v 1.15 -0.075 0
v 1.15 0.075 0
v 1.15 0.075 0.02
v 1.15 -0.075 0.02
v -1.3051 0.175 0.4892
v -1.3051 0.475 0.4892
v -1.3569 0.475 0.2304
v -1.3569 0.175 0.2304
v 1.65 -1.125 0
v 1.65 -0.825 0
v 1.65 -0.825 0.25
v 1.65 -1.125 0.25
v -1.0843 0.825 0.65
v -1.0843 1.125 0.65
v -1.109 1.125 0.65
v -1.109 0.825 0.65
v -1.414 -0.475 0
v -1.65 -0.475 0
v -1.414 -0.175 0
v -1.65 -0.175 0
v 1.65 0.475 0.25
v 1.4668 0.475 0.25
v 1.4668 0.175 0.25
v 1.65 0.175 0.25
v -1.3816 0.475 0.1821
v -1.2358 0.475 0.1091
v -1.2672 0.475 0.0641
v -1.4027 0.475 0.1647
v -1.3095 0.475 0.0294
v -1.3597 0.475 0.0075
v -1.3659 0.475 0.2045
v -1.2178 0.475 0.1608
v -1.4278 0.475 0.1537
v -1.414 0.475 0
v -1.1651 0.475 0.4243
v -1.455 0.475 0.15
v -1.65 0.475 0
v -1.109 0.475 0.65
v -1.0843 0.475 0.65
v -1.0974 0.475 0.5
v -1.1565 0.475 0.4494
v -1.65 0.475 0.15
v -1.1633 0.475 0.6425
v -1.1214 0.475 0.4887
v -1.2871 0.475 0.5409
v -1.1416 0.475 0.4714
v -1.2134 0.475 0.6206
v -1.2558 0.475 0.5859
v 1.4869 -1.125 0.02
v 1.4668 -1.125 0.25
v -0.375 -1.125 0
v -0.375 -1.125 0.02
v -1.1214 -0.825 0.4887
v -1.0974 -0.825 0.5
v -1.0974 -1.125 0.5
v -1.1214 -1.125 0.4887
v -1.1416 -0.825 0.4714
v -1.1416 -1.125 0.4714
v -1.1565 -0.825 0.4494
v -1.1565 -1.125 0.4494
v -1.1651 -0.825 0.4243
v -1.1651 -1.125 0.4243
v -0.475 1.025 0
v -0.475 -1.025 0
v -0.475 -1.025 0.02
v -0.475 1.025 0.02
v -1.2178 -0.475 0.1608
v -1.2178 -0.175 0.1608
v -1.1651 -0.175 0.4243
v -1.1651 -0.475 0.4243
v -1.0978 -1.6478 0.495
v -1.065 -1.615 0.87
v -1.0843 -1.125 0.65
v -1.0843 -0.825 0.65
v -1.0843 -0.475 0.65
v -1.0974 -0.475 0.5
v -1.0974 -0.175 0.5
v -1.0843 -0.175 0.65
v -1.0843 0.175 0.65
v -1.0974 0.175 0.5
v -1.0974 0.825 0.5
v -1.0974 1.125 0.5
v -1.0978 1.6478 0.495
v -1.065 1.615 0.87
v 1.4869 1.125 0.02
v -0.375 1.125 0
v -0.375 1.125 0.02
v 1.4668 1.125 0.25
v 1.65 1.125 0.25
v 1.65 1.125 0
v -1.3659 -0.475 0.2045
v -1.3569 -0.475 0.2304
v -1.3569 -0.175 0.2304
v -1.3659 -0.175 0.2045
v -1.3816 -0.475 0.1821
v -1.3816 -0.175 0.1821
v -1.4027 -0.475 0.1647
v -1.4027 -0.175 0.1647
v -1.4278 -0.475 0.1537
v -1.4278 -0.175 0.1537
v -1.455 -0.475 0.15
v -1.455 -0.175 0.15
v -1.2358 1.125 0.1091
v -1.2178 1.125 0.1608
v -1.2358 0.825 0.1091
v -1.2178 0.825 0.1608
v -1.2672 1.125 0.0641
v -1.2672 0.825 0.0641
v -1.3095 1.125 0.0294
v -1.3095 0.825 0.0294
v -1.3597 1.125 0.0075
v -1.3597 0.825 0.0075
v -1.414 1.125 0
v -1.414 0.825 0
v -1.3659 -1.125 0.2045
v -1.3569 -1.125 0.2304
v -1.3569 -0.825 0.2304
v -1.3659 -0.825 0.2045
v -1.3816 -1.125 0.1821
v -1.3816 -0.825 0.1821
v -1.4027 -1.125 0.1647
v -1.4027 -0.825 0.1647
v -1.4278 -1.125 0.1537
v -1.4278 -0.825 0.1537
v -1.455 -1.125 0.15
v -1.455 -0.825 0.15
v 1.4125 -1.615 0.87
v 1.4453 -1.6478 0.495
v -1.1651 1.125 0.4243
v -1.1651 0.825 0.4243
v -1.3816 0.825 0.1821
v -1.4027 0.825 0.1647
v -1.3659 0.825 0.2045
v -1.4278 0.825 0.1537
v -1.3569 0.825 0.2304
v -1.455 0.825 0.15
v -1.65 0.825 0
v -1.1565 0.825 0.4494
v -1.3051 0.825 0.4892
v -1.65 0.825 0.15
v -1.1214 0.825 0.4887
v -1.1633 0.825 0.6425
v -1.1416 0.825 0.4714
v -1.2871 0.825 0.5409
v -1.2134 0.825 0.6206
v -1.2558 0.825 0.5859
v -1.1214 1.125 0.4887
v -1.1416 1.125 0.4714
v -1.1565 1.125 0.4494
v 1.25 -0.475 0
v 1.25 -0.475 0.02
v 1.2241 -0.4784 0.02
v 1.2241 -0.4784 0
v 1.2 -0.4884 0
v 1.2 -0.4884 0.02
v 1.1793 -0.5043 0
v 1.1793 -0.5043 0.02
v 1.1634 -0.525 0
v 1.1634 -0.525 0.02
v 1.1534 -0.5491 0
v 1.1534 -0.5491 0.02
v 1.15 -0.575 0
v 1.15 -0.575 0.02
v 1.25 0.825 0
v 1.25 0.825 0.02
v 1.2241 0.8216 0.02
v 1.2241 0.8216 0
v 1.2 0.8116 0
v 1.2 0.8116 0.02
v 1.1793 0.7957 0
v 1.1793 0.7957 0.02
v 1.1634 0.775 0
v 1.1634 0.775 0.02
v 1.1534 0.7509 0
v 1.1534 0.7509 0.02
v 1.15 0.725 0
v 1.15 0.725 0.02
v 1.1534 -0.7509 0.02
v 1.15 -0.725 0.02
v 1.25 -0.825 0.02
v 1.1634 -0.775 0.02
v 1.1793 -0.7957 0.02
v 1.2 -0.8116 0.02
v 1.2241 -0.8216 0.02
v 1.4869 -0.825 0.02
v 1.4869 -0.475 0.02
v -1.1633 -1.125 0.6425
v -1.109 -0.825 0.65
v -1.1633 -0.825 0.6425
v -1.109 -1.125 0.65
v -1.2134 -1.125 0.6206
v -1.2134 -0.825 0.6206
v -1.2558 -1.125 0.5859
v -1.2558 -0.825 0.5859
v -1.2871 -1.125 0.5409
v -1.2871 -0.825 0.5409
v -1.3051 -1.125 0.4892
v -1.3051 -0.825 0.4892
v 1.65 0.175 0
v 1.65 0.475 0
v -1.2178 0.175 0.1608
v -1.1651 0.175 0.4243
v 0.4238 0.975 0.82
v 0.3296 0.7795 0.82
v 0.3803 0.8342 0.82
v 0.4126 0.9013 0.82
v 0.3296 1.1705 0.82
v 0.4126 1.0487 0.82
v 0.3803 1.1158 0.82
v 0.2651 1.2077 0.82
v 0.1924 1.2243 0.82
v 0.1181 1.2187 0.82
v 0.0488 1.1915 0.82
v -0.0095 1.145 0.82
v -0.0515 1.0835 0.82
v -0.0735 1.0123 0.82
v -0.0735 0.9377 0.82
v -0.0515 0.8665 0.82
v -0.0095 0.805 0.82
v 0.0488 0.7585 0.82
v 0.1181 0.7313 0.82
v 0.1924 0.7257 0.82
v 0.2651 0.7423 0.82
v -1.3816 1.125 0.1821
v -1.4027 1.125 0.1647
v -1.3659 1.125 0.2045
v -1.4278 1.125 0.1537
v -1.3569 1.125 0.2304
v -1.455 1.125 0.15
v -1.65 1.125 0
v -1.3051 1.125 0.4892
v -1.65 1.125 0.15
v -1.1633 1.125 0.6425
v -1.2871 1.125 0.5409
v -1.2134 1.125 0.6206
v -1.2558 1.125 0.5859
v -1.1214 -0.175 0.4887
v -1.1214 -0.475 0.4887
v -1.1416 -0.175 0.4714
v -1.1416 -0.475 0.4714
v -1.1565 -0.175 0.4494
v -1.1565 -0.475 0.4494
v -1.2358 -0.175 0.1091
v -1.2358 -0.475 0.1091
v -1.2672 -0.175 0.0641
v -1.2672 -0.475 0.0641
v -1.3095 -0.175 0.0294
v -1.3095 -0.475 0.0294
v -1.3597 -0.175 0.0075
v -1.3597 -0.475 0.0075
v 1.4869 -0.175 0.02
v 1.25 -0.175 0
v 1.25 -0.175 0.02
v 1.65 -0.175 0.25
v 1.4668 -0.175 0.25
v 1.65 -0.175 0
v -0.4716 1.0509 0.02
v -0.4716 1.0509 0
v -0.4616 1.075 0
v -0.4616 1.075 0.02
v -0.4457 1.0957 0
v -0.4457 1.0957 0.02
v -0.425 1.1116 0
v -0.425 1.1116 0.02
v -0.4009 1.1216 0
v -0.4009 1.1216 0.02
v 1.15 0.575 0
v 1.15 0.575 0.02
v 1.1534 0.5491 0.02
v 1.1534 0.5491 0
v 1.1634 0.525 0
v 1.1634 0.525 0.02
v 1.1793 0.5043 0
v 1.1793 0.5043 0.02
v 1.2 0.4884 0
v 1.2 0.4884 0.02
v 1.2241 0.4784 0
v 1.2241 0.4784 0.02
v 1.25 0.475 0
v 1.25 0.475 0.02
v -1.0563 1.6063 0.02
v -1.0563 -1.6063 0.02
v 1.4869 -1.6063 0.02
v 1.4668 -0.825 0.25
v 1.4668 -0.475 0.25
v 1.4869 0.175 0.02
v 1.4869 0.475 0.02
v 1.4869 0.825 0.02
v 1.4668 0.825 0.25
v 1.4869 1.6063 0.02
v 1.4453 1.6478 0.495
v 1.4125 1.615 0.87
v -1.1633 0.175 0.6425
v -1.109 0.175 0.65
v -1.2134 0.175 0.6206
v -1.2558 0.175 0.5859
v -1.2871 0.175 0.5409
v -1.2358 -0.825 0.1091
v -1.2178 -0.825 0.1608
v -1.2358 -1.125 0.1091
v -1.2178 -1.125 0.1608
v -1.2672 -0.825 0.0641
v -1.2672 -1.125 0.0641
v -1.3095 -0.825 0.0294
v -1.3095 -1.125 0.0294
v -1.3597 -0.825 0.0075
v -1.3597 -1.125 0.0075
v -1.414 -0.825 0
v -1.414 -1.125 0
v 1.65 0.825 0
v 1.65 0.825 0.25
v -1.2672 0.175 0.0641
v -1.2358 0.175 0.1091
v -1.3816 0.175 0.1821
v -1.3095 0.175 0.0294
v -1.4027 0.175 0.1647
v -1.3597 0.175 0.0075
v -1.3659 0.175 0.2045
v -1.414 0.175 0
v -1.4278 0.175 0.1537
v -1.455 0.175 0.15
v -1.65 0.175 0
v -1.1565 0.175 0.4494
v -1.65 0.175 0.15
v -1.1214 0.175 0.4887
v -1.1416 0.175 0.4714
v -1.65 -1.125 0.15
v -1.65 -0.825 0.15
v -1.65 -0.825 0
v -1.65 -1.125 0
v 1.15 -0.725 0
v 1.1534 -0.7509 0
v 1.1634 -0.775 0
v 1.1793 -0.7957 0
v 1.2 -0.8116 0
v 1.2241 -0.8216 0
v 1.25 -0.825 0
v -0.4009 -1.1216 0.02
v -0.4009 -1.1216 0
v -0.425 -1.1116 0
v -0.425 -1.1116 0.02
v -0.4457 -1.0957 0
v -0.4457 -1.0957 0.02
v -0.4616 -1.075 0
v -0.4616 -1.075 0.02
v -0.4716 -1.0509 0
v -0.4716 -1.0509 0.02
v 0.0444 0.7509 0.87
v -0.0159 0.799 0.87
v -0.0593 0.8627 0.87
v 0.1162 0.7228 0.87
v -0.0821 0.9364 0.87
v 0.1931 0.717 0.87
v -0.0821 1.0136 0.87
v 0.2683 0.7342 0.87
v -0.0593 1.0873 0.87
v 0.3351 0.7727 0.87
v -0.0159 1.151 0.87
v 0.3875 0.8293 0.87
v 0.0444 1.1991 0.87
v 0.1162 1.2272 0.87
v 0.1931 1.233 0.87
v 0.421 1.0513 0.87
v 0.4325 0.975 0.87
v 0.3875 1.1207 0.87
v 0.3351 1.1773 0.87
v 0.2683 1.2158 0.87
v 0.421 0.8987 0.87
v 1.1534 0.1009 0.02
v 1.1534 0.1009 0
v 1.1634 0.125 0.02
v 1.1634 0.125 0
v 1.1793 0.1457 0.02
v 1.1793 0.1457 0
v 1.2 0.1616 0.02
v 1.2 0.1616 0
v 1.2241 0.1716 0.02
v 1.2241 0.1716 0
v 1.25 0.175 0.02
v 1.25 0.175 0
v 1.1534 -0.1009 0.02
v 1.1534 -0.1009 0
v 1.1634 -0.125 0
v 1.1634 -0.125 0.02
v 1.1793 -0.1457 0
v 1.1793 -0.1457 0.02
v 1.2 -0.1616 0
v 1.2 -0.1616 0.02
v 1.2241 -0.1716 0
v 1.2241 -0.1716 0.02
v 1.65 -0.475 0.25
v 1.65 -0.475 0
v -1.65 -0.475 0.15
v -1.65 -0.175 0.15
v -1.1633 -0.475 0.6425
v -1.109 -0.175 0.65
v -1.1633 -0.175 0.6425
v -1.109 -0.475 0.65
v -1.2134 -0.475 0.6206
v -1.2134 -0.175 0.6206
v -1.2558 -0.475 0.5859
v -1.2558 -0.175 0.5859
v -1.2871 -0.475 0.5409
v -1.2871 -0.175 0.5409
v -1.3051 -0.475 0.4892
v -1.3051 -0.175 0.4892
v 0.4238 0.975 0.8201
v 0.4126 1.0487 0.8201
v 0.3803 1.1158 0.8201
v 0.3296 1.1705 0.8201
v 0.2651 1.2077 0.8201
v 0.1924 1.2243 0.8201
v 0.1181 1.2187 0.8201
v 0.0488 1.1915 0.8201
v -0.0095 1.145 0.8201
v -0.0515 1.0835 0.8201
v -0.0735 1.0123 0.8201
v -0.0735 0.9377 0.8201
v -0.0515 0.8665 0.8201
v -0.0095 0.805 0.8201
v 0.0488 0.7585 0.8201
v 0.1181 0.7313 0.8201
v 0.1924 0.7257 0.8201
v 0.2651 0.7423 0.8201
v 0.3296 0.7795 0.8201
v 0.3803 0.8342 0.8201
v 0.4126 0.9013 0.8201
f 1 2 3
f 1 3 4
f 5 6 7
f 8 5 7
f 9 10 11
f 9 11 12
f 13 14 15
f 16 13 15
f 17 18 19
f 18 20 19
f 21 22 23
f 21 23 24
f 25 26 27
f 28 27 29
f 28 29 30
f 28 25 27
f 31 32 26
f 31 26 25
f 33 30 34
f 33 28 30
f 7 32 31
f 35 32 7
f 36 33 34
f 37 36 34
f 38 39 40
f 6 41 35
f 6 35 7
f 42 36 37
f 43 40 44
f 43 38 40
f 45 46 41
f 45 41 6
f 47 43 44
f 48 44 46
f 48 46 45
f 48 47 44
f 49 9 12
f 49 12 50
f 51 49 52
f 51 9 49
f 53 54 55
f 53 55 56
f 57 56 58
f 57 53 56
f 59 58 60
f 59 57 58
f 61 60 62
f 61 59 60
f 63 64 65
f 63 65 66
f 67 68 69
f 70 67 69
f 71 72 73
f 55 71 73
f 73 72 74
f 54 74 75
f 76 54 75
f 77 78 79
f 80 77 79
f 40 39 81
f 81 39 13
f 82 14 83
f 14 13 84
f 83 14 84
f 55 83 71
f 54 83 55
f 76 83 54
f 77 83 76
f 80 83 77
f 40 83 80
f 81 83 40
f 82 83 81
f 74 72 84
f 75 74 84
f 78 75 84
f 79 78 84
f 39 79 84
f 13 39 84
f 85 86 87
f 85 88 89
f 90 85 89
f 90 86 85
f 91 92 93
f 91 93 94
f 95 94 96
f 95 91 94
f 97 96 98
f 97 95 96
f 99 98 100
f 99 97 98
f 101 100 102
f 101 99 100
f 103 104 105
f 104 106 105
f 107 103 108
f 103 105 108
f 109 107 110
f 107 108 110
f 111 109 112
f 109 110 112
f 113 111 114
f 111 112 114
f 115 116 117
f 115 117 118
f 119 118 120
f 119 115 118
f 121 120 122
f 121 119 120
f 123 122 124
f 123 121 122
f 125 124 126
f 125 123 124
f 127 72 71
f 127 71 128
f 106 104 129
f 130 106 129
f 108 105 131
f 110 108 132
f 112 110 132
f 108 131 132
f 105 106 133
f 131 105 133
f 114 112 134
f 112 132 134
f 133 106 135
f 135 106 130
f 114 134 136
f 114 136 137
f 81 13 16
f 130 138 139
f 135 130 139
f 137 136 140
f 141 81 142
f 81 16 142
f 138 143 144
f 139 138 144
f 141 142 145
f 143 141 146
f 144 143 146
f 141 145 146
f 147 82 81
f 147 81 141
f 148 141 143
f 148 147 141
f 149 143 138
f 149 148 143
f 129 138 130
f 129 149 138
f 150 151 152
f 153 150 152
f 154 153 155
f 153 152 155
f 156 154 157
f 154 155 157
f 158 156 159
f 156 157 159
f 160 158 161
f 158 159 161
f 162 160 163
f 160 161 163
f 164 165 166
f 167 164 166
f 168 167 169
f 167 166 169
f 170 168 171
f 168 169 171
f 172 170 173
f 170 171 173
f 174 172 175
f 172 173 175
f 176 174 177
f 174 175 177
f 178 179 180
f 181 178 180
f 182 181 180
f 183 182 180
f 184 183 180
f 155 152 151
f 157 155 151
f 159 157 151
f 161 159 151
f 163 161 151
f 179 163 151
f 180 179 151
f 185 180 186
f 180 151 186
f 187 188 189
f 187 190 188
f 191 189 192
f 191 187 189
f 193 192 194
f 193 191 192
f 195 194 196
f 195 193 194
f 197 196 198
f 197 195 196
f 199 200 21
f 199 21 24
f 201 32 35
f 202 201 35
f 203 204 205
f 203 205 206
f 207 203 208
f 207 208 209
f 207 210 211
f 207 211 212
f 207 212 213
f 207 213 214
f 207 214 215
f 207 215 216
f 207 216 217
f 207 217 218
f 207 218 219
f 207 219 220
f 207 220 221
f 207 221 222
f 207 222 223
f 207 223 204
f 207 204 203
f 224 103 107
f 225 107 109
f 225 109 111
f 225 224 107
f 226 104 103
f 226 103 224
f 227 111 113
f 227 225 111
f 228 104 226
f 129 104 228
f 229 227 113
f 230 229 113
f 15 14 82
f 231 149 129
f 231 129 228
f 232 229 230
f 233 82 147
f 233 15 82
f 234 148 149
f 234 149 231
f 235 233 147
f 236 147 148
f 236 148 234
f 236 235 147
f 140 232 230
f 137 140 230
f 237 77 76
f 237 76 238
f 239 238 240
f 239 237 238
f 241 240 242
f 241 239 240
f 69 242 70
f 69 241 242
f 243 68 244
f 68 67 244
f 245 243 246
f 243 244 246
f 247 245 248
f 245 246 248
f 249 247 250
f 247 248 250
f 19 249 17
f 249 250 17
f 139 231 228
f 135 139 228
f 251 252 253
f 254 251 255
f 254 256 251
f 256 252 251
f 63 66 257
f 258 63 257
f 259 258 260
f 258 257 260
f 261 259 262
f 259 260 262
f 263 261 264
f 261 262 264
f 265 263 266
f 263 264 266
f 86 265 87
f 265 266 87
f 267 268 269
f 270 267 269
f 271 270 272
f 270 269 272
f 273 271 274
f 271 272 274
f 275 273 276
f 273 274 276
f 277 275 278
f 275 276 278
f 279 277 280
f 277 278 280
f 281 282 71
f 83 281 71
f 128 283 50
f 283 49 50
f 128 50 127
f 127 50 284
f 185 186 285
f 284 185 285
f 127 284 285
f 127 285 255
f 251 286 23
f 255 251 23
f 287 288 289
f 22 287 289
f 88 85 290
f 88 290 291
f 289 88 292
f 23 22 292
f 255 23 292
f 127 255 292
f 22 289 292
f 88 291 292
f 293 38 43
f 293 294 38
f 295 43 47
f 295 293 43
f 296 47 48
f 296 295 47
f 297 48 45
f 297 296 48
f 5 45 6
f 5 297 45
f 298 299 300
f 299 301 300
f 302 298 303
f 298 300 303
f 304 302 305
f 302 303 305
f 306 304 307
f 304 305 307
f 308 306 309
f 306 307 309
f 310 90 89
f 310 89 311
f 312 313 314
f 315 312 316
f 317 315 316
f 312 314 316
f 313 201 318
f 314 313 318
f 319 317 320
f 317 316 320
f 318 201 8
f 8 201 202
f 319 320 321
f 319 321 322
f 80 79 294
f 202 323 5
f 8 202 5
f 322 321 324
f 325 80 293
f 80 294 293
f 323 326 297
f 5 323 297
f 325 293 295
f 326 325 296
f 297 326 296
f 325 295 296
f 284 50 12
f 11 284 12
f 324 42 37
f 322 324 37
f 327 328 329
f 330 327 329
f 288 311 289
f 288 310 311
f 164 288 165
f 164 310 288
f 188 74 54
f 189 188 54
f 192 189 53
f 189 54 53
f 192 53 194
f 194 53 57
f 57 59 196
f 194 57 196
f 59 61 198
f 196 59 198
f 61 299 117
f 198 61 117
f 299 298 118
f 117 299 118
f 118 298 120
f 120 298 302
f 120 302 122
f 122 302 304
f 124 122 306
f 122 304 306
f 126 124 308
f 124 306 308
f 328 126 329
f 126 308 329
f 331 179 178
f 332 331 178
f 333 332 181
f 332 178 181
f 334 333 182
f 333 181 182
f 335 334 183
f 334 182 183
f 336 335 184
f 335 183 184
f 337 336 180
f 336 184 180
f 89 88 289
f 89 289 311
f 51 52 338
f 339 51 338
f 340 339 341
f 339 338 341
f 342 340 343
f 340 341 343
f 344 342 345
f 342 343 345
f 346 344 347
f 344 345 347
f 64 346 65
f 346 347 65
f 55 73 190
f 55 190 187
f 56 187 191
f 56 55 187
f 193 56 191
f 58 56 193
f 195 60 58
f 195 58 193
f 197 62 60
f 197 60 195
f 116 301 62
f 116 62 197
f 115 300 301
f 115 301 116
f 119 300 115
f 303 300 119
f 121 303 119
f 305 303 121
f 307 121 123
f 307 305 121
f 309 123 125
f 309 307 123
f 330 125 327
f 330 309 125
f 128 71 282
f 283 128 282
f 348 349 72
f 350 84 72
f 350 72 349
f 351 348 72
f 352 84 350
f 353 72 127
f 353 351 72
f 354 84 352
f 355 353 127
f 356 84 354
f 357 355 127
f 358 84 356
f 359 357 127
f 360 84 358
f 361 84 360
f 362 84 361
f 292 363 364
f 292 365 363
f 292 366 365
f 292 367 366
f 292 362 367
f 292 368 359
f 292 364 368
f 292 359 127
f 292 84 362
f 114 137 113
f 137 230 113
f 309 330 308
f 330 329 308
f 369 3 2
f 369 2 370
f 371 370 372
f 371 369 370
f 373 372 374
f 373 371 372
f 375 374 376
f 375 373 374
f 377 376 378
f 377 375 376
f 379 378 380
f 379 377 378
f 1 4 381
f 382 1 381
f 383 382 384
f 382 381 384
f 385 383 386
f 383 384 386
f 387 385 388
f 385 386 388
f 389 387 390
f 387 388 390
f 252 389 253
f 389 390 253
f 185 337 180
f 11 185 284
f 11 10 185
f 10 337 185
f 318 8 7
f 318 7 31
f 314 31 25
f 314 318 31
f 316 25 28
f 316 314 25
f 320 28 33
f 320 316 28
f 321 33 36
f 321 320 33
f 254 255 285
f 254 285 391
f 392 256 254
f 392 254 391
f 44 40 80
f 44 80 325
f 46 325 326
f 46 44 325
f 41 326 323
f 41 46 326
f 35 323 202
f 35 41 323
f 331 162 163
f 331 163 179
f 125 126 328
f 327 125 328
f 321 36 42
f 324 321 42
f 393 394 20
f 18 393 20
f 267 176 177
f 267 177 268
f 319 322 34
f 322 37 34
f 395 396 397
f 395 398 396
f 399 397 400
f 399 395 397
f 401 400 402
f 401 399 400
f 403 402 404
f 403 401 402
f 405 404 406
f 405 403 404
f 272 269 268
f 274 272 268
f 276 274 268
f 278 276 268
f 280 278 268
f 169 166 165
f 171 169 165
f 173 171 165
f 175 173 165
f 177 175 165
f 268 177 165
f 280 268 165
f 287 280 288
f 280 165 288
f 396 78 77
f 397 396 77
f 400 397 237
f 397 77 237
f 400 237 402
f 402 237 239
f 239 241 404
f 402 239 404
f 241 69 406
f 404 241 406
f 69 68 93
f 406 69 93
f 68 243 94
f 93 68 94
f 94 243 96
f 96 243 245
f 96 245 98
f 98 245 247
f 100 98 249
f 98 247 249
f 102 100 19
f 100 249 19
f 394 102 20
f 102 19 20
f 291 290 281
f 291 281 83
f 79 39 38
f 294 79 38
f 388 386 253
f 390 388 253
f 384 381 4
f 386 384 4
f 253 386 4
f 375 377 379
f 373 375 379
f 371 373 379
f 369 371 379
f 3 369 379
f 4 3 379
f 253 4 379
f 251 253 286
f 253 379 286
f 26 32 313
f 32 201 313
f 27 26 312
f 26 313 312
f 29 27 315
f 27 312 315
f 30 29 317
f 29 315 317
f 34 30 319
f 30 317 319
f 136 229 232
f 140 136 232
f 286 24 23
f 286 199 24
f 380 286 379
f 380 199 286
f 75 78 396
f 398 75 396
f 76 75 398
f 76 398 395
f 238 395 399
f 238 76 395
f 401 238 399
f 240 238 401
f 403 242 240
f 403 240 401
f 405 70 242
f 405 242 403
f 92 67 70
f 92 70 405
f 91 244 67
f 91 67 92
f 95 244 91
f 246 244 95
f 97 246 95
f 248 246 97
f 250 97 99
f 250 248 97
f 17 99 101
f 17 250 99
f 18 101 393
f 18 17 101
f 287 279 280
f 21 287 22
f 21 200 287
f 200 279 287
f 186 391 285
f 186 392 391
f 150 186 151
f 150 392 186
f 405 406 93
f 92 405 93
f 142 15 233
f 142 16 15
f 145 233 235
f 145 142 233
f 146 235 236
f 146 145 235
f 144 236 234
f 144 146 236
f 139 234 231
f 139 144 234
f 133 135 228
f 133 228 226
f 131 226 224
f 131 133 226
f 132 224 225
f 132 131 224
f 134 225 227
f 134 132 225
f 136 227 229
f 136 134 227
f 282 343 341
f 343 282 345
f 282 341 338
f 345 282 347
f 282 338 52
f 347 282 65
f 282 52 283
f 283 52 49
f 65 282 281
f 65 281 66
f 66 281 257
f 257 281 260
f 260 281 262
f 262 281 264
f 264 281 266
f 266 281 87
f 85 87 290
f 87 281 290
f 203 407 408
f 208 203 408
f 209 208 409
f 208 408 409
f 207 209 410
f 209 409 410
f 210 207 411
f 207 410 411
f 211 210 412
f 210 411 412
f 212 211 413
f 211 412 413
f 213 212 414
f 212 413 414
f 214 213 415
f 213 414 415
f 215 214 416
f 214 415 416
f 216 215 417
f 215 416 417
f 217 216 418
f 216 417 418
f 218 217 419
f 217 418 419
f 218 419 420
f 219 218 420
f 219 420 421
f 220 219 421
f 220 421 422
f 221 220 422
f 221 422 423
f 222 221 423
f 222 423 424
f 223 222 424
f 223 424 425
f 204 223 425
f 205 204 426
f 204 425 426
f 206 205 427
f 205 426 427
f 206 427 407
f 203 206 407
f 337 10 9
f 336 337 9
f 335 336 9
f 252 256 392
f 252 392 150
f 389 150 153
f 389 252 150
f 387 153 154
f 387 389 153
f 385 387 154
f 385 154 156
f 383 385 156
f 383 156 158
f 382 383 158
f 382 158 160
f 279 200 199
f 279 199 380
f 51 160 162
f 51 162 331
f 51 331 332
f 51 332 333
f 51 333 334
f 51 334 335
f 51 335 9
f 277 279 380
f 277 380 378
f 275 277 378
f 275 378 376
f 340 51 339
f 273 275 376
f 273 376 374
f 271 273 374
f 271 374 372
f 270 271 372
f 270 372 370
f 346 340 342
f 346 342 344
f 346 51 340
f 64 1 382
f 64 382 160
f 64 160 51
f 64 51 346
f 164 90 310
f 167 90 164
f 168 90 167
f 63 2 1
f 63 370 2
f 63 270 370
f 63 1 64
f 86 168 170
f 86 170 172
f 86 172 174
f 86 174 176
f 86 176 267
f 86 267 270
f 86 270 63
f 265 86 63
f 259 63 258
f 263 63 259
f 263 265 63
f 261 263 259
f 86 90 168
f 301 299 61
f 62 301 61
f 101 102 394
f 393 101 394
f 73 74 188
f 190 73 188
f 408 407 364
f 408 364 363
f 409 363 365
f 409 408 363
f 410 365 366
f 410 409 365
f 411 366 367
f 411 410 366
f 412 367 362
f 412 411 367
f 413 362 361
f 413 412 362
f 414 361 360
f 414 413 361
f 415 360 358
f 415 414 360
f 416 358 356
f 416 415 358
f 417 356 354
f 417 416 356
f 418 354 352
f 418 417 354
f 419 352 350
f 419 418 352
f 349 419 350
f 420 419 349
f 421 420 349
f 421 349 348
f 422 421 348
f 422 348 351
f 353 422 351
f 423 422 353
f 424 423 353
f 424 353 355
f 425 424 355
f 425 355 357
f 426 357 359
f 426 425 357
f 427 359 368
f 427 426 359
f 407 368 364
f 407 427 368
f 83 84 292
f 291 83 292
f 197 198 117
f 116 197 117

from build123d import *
from OCP.BRepFilletAPI import BRepFilletAPI_MakeChamfer

# Parameters (mm, degrees)
BOSS_EXTRUDE1_DEPTH    = 0.25
FILLET1_R              = 0.1
SKETCH3_W              = 2.6
SKETCH3_H              = 3.3
BOSS_EXTRUDE2_DEPTH    = 0.85
CHAMFER2_SIZE          = 1
CHAMFER2_SIZE_2        = 0.087488664
CHAMFER3_SIZE          = 0.4
CHAMFER3_SIZE2         = 0.034995465
CHAMFER4_SIZE          = 0.043744332
CHAMFER4_SIZE_2        = 0.5
BOSS_EXTRUDE3_DEPTH    = 0.15
FILLET2_R              = 0.1
FILLET3_R              = 0.2
LPATTERN1_COUNT        = 4
LPATTERN1_PITCH        = 0.65
FILLET2_OF_LPATTERN1_R = 0.1
FILLET3_OF_LPATTERN1_R = 0.2
SKETCH5_R              = 0.25
CUT_EXTRUDE1_DEPTH     = 0.05
CHAMFER5_SIZE2         = 0.05
CHAMFER5_SIZE          = 0.008816349


# Some blends are built 0.0001 mm under size
with BuildPart() as part:
    # Sketch2 → Boss-Extrude1 (new body)
    with BuildSketch(Plane.XY):
        Polygon((1.15, 0.175), (1.15, -0.175), (1.65, -0.175), (1.65, -0.475), (1.15, -0.475), (1.15, -0.825), (1.65, -0.825), (1.65, -1.125), (-0.475, -1.125), (-0.475, 1.125), (1.65, 1.125), (1.65, 0.825), (1.15, 0.825), (1.15, 0.475), (1.65, 0.475), (1.65, 0.175), align=None)
    extrude(amount=BOSS_EXTRUDE1_DEPTH)

    # Fillet1
    fillet1_edges = [part.edges().sort_by_distance(p)[0] for p in [
        (-0.475, 1.125, 0.125),
        (1.15, 0.825, 0.125),
        (1.15, 0.475, 0.125),
        (1.15, 0.175, 0.125),
        (1.15, -0.175, 0.125),
        (1.15, -0.475, 0.125),
        (1.15, -0.825, 0.125),
        (-0.475, -1.125, 0.125),
    ]]
    fillet(fillet1_edges, radius=FILLET1_R)

    # Sketch3 → Boss-Extrude2 (add)
    with BuildSketch(Plane.XY.offset(0.02)):
        with Locations((0.2, 0)):
            Rectangle(SKETCH3_W, SKETCH3_H)
    extrude(amount=BOSS_EXTRUDE2_DEPTH)

    # Chamfer2
    # the kernel refuses this chamfer: 1, 0.087488664 mm, written as the material it takes off along each edge
    with BuildSketch(Plane(origin=(1.5, 4.24963408, 0.87), x_dir=(0.0033526157940331684, 0, -0.9999943799678764), z_dir=(0, -1, 0))) as chamfer2_piece_1_section:
        Polygon((CHAMFER2_SIZE * 0.999994379968, -CHAMFER2_SIZE * 0.00335261579403), (-CHAMFER2_SIZE_2 * 0.00335261577587, -CHAMFER2_SIZE_2 * 0.999994374549), (0, 0), align=None)
    chamfer2_piece_1 = extrude(amount=8.49926816, mode=Mode.PRIVATE)
    chamfer2_piece_1 = split(chamfer2_piece_1, bisect_by=Plane(origin=(1.487680055, 1.125, 0.15163522), z_dir=(0, 1, 0)), keep=Keep.TOP, mode=Mode.PRIVATE)
    add(chamfer2_piece_1, mode=Mode.SUBTRACT)
    with BuildSketch(Plane(origin=(1.5, 4.24963408, 0.87), x_dir=(0.0033526157940331684, 0, -0.9999943799678764), z_dir=(0, -1, 0))) as chamfer2_piece_2_section:
        Polygon((CHAMFER2_SIZE * 0.999994379968, -CHAMFER2_SIZE * 0.00335261579403), (-CHAMFER2_SIZE_2 * 0.00335261577587, -CHAMFER2_SIZE_2 * 0.999994374549), (0, 0), align=None)
    chamfer2_piece_2 = extrude(amount=8.49926816, mode=Mode.PRIVATE)
    chamfer2_piece_2 = split(chamfer2_piece_2, bisect_by=Plane(origin=(1.467785575, 0.975, 0.25), z_dir=(0, 0, 1)), keep=Keep.TOP, mode=Mode.PRIVATE)
    add(chamfer2_piece_2, mode=Mode.SUBTRACT)
    with BuildSketch(Plane(origin=(1.5, 4.24963408, 0.87), x_dir=(0.0033526157940331684, 0, -0.9999943799678764), z_dir=(0, -1, 0))) as chamfer2_piece_3_section:
        Polygon((CHAMFER2_SIZE * 0.999994379968, -CHAMFER2_SIZE * 0.00335261579403), (-CHAMFER2_SIZE_2 * 0.00335261577587, -CHAMFER2_SIZE_2 * 0.999994374549), (0, 0), align=None)
    chamfer2_piece_3 = extrude(amount=8.49926816, mode=Mode.PRIVATE)
    chamfer2_piece_3 = split(chamfer2_piece_3, bisect_by=Plane(origin=(1.487680055, 0.475, 0.15163522), z_dir=(0, 1, 0)), keep=Keep.TOP, mode=Mode.PRIVATE)
    chamfer2_piece_3 = split(chamfer2_piece_3, bisect_by=Plane(origin=(1.487680055, 0.825, 0.15163522), z_dir=(0, -1, 0)), keep=Keep.TOP, mode=Mode.PRIVATE)
    add(chamfer2_piece_3, mode=Mode.SUBTRACT)
    with BuildSketch(Plane(origin=(1.5, 4.24963408, 0.87), x_dir=(0.0033526157940331684, 0, -0.9999943799678764), z_dir=(0, -1, 0))) as chamfer2_piece_4_section:
        Polygon((CHAMFER2_SIZE * 0.999994379968, -CHAMFER2_SIZE * 0.00335261579403), (-CHAMFER2_SIZE_2 * 0.00335261577587, -CHAMFER2_SIZE_2 * 0.999994374549), (0, 0), align=None)
    chamfer2_piece_4 = extrude(amount=8.49926816, mode=Mode.PRIVATE)
    chamfer2_piece_4 = split(chamfer2_piece_4, bisect_by=Plane(origin=(1.487680055, 0.175, 0.15163522), z_dir=(0, -1, 0)), keep=Keep.TOP, mode=Mode.PRIVATE)
    chamfer2_piece_4 = split(chamfer2_piece_4, bisect_by=Plane(origin=(1.487680055, -0.175, 0.15163522), z_dir=(0, 1, 0)), keep=Keep.TOP, mode=Mode.PRIVATE)
    add(chamfer2_piece_4, mode=Mode.SUBTRACT)
    with BuildSketch(Plane(origin=(1.5, 4.24963408, 0.87), x_dir=(0.0033526157940331684, 0, -0.9999943799678764), z_dir=(0, -1, 0))) as chamfer2_piece_5_section:
        Polygon((CHAMFER2_SIZE * 0.999994379968, -CHAMFER2_SIZE * 0.00335261579403), (-CHAMFER2_SIZE_2 * 0.00335261577587, -CHAMFER2_SIZE_2 * 0.999994374549), (0, 0), align=None)
    chamfer2_piece_5 = extrude(amount=8.49926816, mode=Mode.PRIVATE)
    chamfer2_piece_5 = split(chamfer2_piece_5, bisect_by=Plane(origin=(1.487680055, -0.475, 0.15163522), z_dir=(0, -1, 0)), keep=Keep.TOP, mode=Mode.PRIVATE)
    chamfer2_piece_5 = split(chamfer2_piece_5, bisect_by=Plane(origin=(1.487680055, -0.825, 0.15163522), z_dir=(0, 1, 0)), keep=Keep.TOP, mode=Mode.PRIVATE)
    add(chamfer2_piece_5, mode=Mode.SUBTRACT)
    with BuildSketch(Plane(origin=(1.5, 4.24963408, 0.87), x_dir=(0.0033526157940331684, 0, -0.9999943799678764), z_dir=(0, -1, 0))) as chamfer2_piece_6_section:
        Polygon((CHAMFER2_SIZE * 0.999994379968, -CHAMFER2_SIZE * 0.00335261579403), (-CHAMFER2_SIZE_2 * 0.00335261577587, -CHAMFER2_SIZE_2 * 0.999994374549), (0, 0), align=None)
    chamfer2_piece_6 = extrude(amount=8.49926816, mode=Mode.PRIVATE)
    chamfer2_piece_6 = split(chamfer2_piece_6, bisect_by=Plane(origin=(1.487680055, -1.125, 0.15163522), z_dir=(0, -1, 0)), keep=Keep.TOP, mode=Mode.PRIVATE)
    add(chamfer2_piece_6, mode=Mode.SUBTRACT)

    # Chamfer3: one chamfer whose edges measure the first distance from different faces: ONE call of the kernel's chamfer builder (chamfer() names one face for all edges)
    chamfer3_edges_1 = [part.edges().sort_by_distance(p)[0] for p in [
        (-1.1, 0, 0.87),
    ]]
    chamfer3_side_1 = [part.faces().sort_by_distance(p)[0] for p in [
        (-1.1, 0, 0.445),
    ]]
    chamfer3_edges_2 = [part.edges().sort_by_distance(p)[0] for p in [
        (0.156255668, -1.65, 0.87),
    ]]
    chamfer3_side_2 = [part.faces().sort_by_distance(p)[0] for p in [
        (0.174937383, -1.65, 0.442934048),
    ]]
    chamfer3_edges_3 = [part.edges().sort_by_distance(p)[0] for p in [
        (0.156255668, 1.65, 0.87),
    ]]
    chamfer3_side_3 = [part.faces().sort_by_distance(p)[0] for p in [
        (0.174937383, 1.65, 0.442934048),
    ]]
    chamfer3 = BRepFilletAPI_MakeChamfer(part.part.solid().wrapped)
    for e in chamfer3_edges_1:
        chamfer3.Add(CHAMFER3_SIZE, CHAMFER3_SIZE2, e.wrapped, chamfer3_side_1[0].wrapped)  # the first distance lies on this face
    for e in chamfer3_edges_2:
        chamfer3.Add(CHAMFER3_SIZE, CHAMFER3_SIZE2, e.wrapped, chamfer3_side_2[0].wrapped)  # the first distance lies on this face
    for e in chamfer3_edges_3:
        chamfer3.Add(CHAMFER3_SIZE, CHAMFER3_SIZE2, e.wrapped, chamfer3_side_3[0].wrapped)  # the first distance lies on this face
    add(Compound.cast(chamfer3.Shape()), mode=Mode.REPLACE)

    # Chamfer4
    # the kernel refuses this chamfer: 0.5, 0.043744332 mm, written as the material it takes off along each edge
    with BuildSketch(Plane(origin=(-2.39981704, 1.65, 0.02), x_dir=(0, -0.9159861691531118, -0.4012098427509062), z_dir=(1, 0, 0))) as chamfer4_piece_1:
        Polygon((CHAMFER4_SIZE * 0.91598616419, -CHAMFER4_SIZE * 0.401209840577), (-CHAMFER4_SIZE_2 * 0.401209842751, -CHAMFER4_SIZE_2 * 0.915986169153), (0, 0), align=None)
    extrude(amount=5.18651078, mode=Mode.SUBTRACT)
    with BuildSketch(Plane(origin=(-1.1, -2.94981704, 0.02), x_dir=(0.9159861691531118, 0, -0.4012098427509062), z_dir=(0, 1, 0))) as chamfer4_piece_2:
        Polygon((CHAMFER4_SIZE * 0.91598616419, -CHAMFER4_SIZE * 0.401209840577), (-CHAMFER4_SIZE_2 * 0.401209842751, -CHAMFER4_SIZE_2 * 0.915986169153), (0, 0), align=None)
    extrude(amount=5.89963408, mode=Mode.SUBTRACT)
    with BuildSketch(Plane(origin=(2.78669374, -1.65, 0.02), x_dir=(0, -0.0033526157940331684, 0.9999943799678764), z_dir=(-1, 0, 0))) as chamfer4_piece_3:
        Polygon((CHAMFER4_SIZE_2 * 0.999994379968, CHAMFER4_SIZE_2 * 0.00335261579403), (-CHAMFER4_SIZE * 0.00335261577587, CHAMFER4_SIZE * 0.999994374549), (0, 0), align=None)
    extrude(amount=5.18651078, mode=Mode.SUBTRACT)

    # Sketch4 → Boss-Extrude3 (add, symmetric)
    with BuildSketch(Plane(origin=(0, 0.975, 0), x_dir=(1, 0, 0), z_dir=(0, 1, 0))):
        Polygon((-1.65, 0), (-1.25, 0), (-1.15, -0.5), (-0.849772873, -0.5), (-0.849772873, -0.65), (-1.272970585, -0.65), (-1.372970585, -0.15), (-1.65, -0.15), align=None)
    boss_extrude3 = extrude(amount=BOSS_EXTRUDE3_DEPTH, both=True)

    # Fillet2
    # the kernel refuses this fillet: 0.1 mm, written as the material it adds along each edge
    with BuildSketch(Plane(origin=(-1.372970585, 0.825, 0.15), x_dir=(0.19611613513818507, 0, 0.98058067569092), z_dir=(0, 1, 0))) as fillet2_piece_1:
        with BuildLine():
            CenterArc((FILLET2_R * 0.819803902719, -FILLET2_R), FILLET2_R, 90, 78.690067526)
            Line((-FILLET2_R * 0.160776772972, -FILLET2_R * 0.803883864862), (-FILLET2_R * 0.180388386486, -FILLET2_R * 0.799961542159))
            Line((-FILLET2_R * 0.180388386486, -FILLET2_R * 0.799961542159), (-FILLET2_R * 0.0163960780544, FILLET2_R * 0.02))
            Line((-FILLET2_R * 0.0163960780544, FILLET2_R * 0.02), (FILLET2_R * 0.819803902719, FILLET2_R * 0.02))
            Line((FILLET2_R * 0.819803902719, FILLET2_R * 0.02), (FILLET2_R * 0.819803902719, 0))
        make_face()
    extrude(amount=0.3)
    with BuildSketch(Plane(origin=(-1.15, 1.125, 0.5), x_dir=(1, 0, 0), z_dir=(0, -1, 0))) as fillet2_piece_2:
        with BuildLine():
            CenterArc((0.082920302, -0.095300441), FILLET2_R, 107.635259495, 61.054808031)
            Line((-0.015137766, -0.075688828), (-0.017098927, -0.075296595))
            Line((-0.017098927, -0.075296595), (-0.001961161, 0.000392232))
            Line((-0.001961161, 0.000392232), (0, 0.002))
            ThreePointArc((0, 0.002), (0.02631233, 0.002), (0.052018747, 0.001906009))
            Line((0.052018747, 0.001906009), (0.05262466, 0))
        make_face()
    extrude(amount=0.3)

    # Fillet3
    fillet3_edges = [part.edges().sort_by_distance(p)[0] for p in [
        (-1.272970585, 0.975, 0.65),
        (-1.25, 0.975, 0),
    ]]
    fillet(fillet3_edges, radius=FILLET3_R)

    # LPattern1: Boss-Extrude3 ×4
    with Locations(*[(0, -i * LPATTERN1_PITCH, 0) for i in range(1, LPATTERN1_COUNT)]):
        add(boss_extrude3)

    # Fillet2 of LPattern1
    # the kernel refuses this fillet: 0.1 mm, written as the material it adds along each edge
    with BuildSketch(Plane(origin=(-1.372970585, 0.175, 0.15), x_dir=(0.19611613513818507, 0, 0.98058067569092), z_dir=(0, 1, 0)), Plane(origin=(-1.372970585, -0.475, 0.15), x_dir=(0.19611613513818507, 0, 0.98058067569092), z_dir=(0, 1, 0)), Plane(origin=(-1.372970585, -1.125, 0.15), x_dir=(0.19611613513818507, 0, 0.98058067569092), z_dir=(0, 1, 0))) as fillet2_of_lpattern1_piece_1:
        with BuildLine():
            CenterArc((FILLET2_OF_LPATTERN1_R * 0.819803902719, -FILLET2_OF_LPATTERN1_R), FILLET2_OF_LPATTERN1_R, 90, 78.690067526)
            Line((-FILLET2_OF_LPATTERN1_R * 0.160776772972, -FILLET2_OF_LPATTERN1_R * 0.803883864862), (-FILLET2_OF_LPATTERN1_R * 0.180388386486, -FILLET2_OF_LPATTERN1_R * 0.799961542159))
            Line((-FILLET2_OF_LPATTERN1_R * 0.180388386486, -FILLET2_OF_LPATTERN1_R * 0.799961542159), (-FILLET2_OF_LPATTERN1_R * 0.0163960780544, FILLET2_OF_LPATTERN1_R * 0.02))
            Line((-FILLET2_OF_LPATTERN1_R * 0.0163960780544, FILLET2_OF_LPATTERN1_R * 0.02), (FILLET2_OF_LPATTERN1_R * 0.819803902719, FILLET2_OF_LPATTERN1_R * 0.02))
            Line((FILLET2_OF_LPATTERN1_R * 0.819803902719, FILLET2_OF_LPATTERN1_R * 0.02), (FILLET2_OF_LPATTERN1_R * 0.819803902719, 0))
        make_face()
    extrude(amount=0.3)
    with BuildSketch(Plane(origin=(-1.15, 0.475, 0.5), x_dir=(1, 0, 0), z_dir=(0, -1, 0)), Plane(origin=(-1.15, -0.175, 0.5), x_dir=(1, 0, 0), z_dir=(0, -1, 0)), Plane(origin=(-1.15, -0.825, 0.5), x_dir=(1, 0, 0), z_dir=(0, -1, 0))) as fillet2_of_lpattern1_piece_2:
        with BuildLine():
            CenterArc((0.082920302, -0.095300441), FILLET2_OF_LPATTERN1_R, 107.635259495, 61.054808031)
            Line((-0.015137766, -0.075688828), (-0.017098927, -0.075296595))
            Line((-0.017098927, -0.075296595), (-0.001961161, 0.000392232))
            Line((-0.001961161, 0.000392232), (0, 0.002))
            ThreePointArc((0, 0.002), (0.02631233, 0.002), (0.052018747, 0.001906009))
            Line((0.052018747, 0.001906009), (0.05262466, 0))
        make_face()
    extrude(amount=0.3)

    # Fillet3 of LPattern1
    fillet3_of_lpattern1_edges = [part.edges().sort_by_distance(p)[0] for p in [
        (-1.272970585, 0.325, 0.65),
        (-1.25, 0.325, 0),
        (-1.272970585, -0.325, 0.65),
        (-1.25, -0.325, 0),
        (-1.272970585, -0.975, 0.65),
        (-1.25, -0.975, 0),
    ]]
    fillet(fillet3_of_lpattern1_edges, radius=FILLET3_OF_LPATTERN1_R)

    # Sketch5 → Cut-Extrude1 (cut)
    with BuildSketch(Plane.XY.offset(0.87)):
        with Locations((0.173753401, 0.975)):
            Circle(SKETCH5_R)
    extrude(amount=-CUT_EXTRUDE1_DEPTH, mode=Mode.SUBTRACT)

    # Chamfer5
    chamfer5_edges = [part.edges().sort_by_distance(p)[0] for p in [
        (-0.076246599, 0.975, 0.87),
    ]]
    chamfer5_side = [part.faces().sort_by_distance(p)[0] for p in [
        (-0.076422926, 0.975, 0.87),
    ]]
    chamfer(chamfer5_edges, length=CHAMFER5_SIZE - 0.0001, length2=CHAMFER5_SIZE2 - 0.0001, reference=chamfer5_side[0])  # a hair under: the kernel refuses the full size


solid = part.part
